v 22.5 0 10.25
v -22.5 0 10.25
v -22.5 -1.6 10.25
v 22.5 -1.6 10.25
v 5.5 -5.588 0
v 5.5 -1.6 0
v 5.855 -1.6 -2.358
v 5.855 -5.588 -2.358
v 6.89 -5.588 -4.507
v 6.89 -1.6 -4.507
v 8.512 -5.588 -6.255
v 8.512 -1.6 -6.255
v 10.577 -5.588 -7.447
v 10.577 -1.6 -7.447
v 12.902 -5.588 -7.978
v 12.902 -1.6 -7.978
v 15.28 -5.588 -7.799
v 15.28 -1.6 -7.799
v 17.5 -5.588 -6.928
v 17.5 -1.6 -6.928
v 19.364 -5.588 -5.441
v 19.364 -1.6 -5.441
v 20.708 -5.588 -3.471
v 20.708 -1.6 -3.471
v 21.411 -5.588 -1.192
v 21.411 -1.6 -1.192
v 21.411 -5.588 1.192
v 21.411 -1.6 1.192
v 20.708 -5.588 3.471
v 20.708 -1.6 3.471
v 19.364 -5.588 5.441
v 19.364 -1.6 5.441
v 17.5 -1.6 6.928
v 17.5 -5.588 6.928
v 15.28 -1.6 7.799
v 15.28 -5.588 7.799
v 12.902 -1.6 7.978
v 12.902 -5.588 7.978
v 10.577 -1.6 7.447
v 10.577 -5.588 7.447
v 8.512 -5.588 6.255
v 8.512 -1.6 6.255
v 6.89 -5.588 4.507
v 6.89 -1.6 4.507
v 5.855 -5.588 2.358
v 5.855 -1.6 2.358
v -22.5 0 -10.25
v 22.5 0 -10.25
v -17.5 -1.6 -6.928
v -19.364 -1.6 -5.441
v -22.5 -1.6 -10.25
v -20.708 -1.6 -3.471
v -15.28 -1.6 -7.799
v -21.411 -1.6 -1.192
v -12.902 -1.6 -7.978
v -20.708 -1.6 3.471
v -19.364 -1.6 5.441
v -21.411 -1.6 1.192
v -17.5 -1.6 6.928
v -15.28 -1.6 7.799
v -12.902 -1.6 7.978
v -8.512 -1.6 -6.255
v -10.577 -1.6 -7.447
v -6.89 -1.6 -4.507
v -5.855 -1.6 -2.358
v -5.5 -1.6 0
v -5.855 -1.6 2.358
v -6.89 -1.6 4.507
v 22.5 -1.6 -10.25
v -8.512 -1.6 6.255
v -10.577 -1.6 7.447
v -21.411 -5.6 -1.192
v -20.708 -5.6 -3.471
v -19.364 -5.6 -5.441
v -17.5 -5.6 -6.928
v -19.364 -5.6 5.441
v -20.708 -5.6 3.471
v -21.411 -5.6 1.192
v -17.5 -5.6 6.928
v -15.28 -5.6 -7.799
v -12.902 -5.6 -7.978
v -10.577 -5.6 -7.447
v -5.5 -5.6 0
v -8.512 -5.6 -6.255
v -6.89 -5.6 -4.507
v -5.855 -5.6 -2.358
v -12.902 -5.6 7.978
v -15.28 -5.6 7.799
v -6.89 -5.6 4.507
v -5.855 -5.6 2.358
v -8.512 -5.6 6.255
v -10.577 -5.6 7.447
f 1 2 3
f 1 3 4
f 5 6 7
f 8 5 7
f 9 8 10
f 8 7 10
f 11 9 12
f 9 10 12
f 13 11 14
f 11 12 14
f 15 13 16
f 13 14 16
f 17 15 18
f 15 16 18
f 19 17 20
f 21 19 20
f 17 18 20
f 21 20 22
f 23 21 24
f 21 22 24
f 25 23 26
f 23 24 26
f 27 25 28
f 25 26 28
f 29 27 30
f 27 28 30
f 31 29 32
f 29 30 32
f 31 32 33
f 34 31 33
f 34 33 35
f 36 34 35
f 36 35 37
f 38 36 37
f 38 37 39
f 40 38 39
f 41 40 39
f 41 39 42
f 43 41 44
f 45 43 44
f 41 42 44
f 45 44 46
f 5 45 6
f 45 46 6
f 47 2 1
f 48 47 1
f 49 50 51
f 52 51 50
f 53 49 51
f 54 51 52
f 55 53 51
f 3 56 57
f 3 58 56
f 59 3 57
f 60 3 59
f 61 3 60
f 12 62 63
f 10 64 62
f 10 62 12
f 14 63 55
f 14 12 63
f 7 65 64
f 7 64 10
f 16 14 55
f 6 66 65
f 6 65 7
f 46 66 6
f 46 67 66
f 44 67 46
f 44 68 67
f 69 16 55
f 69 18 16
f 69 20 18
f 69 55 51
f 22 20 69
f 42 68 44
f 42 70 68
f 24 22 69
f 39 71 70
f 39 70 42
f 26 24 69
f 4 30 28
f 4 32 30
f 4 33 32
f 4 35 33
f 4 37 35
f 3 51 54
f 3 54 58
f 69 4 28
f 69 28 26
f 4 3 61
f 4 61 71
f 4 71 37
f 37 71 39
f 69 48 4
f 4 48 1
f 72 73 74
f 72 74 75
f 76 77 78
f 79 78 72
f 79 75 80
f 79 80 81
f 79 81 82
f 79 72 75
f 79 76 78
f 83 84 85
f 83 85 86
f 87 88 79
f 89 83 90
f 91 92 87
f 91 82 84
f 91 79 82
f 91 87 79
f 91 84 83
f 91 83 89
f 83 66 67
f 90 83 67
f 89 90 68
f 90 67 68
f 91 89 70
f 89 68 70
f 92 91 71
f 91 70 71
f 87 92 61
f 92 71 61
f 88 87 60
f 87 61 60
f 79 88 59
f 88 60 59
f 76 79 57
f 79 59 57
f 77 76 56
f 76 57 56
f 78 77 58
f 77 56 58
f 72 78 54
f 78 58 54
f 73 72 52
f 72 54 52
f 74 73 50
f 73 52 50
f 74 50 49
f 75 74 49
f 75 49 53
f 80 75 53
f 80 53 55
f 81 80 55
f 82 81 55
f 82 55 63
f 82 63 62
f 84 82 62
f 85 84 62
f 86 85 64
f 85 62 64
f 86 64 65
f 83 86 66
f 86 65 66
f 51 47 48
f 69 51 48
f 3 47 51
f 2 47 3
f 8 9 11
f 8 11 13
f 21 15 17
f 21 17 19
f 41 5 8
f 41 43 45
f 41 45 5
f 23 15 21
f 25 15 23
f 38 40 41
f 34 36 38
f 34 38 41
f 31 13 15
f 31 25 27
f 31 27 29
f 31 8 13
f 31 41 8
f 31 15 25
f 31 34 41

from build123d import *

# Parameters (mm, degrees)
F0_W     = 45
F0_H     = 20.5
F1_DEPTH = 1.6
F2_R     = 8
F3_DEPTH = 4
F4_DEPTH = 3.9878


with BuildPart() as f1:
    # F0 (on Front) → F1 (new body)
    with BuildSketch(Plane.XZ):
        Rectangle(F0_W, F0_H)
    extrude(amount=F1_DEPTH)

    # F2 (on face) → F3 (join)
    with BuildSketch(Plane.XZ.offset(1.6)):
        with Locations((-13.5, 0)):
            Circle(F2_R)
    extrude(amount=F3_DEPTH)

    # F2 (on face) → F4 (join)
    with BuildSketch(Plane.XZ.offset(1.6)):
        with BuildLine():
            ThreePointArc((21.5, 0), (13.5, 8), (5.5, 0))
            ThreePointArc((5.5, 0), (13.5, -8), (21.5, 0))
        make_face()
    extrude(amount=F4_DEPTH)


solid = f1.part
